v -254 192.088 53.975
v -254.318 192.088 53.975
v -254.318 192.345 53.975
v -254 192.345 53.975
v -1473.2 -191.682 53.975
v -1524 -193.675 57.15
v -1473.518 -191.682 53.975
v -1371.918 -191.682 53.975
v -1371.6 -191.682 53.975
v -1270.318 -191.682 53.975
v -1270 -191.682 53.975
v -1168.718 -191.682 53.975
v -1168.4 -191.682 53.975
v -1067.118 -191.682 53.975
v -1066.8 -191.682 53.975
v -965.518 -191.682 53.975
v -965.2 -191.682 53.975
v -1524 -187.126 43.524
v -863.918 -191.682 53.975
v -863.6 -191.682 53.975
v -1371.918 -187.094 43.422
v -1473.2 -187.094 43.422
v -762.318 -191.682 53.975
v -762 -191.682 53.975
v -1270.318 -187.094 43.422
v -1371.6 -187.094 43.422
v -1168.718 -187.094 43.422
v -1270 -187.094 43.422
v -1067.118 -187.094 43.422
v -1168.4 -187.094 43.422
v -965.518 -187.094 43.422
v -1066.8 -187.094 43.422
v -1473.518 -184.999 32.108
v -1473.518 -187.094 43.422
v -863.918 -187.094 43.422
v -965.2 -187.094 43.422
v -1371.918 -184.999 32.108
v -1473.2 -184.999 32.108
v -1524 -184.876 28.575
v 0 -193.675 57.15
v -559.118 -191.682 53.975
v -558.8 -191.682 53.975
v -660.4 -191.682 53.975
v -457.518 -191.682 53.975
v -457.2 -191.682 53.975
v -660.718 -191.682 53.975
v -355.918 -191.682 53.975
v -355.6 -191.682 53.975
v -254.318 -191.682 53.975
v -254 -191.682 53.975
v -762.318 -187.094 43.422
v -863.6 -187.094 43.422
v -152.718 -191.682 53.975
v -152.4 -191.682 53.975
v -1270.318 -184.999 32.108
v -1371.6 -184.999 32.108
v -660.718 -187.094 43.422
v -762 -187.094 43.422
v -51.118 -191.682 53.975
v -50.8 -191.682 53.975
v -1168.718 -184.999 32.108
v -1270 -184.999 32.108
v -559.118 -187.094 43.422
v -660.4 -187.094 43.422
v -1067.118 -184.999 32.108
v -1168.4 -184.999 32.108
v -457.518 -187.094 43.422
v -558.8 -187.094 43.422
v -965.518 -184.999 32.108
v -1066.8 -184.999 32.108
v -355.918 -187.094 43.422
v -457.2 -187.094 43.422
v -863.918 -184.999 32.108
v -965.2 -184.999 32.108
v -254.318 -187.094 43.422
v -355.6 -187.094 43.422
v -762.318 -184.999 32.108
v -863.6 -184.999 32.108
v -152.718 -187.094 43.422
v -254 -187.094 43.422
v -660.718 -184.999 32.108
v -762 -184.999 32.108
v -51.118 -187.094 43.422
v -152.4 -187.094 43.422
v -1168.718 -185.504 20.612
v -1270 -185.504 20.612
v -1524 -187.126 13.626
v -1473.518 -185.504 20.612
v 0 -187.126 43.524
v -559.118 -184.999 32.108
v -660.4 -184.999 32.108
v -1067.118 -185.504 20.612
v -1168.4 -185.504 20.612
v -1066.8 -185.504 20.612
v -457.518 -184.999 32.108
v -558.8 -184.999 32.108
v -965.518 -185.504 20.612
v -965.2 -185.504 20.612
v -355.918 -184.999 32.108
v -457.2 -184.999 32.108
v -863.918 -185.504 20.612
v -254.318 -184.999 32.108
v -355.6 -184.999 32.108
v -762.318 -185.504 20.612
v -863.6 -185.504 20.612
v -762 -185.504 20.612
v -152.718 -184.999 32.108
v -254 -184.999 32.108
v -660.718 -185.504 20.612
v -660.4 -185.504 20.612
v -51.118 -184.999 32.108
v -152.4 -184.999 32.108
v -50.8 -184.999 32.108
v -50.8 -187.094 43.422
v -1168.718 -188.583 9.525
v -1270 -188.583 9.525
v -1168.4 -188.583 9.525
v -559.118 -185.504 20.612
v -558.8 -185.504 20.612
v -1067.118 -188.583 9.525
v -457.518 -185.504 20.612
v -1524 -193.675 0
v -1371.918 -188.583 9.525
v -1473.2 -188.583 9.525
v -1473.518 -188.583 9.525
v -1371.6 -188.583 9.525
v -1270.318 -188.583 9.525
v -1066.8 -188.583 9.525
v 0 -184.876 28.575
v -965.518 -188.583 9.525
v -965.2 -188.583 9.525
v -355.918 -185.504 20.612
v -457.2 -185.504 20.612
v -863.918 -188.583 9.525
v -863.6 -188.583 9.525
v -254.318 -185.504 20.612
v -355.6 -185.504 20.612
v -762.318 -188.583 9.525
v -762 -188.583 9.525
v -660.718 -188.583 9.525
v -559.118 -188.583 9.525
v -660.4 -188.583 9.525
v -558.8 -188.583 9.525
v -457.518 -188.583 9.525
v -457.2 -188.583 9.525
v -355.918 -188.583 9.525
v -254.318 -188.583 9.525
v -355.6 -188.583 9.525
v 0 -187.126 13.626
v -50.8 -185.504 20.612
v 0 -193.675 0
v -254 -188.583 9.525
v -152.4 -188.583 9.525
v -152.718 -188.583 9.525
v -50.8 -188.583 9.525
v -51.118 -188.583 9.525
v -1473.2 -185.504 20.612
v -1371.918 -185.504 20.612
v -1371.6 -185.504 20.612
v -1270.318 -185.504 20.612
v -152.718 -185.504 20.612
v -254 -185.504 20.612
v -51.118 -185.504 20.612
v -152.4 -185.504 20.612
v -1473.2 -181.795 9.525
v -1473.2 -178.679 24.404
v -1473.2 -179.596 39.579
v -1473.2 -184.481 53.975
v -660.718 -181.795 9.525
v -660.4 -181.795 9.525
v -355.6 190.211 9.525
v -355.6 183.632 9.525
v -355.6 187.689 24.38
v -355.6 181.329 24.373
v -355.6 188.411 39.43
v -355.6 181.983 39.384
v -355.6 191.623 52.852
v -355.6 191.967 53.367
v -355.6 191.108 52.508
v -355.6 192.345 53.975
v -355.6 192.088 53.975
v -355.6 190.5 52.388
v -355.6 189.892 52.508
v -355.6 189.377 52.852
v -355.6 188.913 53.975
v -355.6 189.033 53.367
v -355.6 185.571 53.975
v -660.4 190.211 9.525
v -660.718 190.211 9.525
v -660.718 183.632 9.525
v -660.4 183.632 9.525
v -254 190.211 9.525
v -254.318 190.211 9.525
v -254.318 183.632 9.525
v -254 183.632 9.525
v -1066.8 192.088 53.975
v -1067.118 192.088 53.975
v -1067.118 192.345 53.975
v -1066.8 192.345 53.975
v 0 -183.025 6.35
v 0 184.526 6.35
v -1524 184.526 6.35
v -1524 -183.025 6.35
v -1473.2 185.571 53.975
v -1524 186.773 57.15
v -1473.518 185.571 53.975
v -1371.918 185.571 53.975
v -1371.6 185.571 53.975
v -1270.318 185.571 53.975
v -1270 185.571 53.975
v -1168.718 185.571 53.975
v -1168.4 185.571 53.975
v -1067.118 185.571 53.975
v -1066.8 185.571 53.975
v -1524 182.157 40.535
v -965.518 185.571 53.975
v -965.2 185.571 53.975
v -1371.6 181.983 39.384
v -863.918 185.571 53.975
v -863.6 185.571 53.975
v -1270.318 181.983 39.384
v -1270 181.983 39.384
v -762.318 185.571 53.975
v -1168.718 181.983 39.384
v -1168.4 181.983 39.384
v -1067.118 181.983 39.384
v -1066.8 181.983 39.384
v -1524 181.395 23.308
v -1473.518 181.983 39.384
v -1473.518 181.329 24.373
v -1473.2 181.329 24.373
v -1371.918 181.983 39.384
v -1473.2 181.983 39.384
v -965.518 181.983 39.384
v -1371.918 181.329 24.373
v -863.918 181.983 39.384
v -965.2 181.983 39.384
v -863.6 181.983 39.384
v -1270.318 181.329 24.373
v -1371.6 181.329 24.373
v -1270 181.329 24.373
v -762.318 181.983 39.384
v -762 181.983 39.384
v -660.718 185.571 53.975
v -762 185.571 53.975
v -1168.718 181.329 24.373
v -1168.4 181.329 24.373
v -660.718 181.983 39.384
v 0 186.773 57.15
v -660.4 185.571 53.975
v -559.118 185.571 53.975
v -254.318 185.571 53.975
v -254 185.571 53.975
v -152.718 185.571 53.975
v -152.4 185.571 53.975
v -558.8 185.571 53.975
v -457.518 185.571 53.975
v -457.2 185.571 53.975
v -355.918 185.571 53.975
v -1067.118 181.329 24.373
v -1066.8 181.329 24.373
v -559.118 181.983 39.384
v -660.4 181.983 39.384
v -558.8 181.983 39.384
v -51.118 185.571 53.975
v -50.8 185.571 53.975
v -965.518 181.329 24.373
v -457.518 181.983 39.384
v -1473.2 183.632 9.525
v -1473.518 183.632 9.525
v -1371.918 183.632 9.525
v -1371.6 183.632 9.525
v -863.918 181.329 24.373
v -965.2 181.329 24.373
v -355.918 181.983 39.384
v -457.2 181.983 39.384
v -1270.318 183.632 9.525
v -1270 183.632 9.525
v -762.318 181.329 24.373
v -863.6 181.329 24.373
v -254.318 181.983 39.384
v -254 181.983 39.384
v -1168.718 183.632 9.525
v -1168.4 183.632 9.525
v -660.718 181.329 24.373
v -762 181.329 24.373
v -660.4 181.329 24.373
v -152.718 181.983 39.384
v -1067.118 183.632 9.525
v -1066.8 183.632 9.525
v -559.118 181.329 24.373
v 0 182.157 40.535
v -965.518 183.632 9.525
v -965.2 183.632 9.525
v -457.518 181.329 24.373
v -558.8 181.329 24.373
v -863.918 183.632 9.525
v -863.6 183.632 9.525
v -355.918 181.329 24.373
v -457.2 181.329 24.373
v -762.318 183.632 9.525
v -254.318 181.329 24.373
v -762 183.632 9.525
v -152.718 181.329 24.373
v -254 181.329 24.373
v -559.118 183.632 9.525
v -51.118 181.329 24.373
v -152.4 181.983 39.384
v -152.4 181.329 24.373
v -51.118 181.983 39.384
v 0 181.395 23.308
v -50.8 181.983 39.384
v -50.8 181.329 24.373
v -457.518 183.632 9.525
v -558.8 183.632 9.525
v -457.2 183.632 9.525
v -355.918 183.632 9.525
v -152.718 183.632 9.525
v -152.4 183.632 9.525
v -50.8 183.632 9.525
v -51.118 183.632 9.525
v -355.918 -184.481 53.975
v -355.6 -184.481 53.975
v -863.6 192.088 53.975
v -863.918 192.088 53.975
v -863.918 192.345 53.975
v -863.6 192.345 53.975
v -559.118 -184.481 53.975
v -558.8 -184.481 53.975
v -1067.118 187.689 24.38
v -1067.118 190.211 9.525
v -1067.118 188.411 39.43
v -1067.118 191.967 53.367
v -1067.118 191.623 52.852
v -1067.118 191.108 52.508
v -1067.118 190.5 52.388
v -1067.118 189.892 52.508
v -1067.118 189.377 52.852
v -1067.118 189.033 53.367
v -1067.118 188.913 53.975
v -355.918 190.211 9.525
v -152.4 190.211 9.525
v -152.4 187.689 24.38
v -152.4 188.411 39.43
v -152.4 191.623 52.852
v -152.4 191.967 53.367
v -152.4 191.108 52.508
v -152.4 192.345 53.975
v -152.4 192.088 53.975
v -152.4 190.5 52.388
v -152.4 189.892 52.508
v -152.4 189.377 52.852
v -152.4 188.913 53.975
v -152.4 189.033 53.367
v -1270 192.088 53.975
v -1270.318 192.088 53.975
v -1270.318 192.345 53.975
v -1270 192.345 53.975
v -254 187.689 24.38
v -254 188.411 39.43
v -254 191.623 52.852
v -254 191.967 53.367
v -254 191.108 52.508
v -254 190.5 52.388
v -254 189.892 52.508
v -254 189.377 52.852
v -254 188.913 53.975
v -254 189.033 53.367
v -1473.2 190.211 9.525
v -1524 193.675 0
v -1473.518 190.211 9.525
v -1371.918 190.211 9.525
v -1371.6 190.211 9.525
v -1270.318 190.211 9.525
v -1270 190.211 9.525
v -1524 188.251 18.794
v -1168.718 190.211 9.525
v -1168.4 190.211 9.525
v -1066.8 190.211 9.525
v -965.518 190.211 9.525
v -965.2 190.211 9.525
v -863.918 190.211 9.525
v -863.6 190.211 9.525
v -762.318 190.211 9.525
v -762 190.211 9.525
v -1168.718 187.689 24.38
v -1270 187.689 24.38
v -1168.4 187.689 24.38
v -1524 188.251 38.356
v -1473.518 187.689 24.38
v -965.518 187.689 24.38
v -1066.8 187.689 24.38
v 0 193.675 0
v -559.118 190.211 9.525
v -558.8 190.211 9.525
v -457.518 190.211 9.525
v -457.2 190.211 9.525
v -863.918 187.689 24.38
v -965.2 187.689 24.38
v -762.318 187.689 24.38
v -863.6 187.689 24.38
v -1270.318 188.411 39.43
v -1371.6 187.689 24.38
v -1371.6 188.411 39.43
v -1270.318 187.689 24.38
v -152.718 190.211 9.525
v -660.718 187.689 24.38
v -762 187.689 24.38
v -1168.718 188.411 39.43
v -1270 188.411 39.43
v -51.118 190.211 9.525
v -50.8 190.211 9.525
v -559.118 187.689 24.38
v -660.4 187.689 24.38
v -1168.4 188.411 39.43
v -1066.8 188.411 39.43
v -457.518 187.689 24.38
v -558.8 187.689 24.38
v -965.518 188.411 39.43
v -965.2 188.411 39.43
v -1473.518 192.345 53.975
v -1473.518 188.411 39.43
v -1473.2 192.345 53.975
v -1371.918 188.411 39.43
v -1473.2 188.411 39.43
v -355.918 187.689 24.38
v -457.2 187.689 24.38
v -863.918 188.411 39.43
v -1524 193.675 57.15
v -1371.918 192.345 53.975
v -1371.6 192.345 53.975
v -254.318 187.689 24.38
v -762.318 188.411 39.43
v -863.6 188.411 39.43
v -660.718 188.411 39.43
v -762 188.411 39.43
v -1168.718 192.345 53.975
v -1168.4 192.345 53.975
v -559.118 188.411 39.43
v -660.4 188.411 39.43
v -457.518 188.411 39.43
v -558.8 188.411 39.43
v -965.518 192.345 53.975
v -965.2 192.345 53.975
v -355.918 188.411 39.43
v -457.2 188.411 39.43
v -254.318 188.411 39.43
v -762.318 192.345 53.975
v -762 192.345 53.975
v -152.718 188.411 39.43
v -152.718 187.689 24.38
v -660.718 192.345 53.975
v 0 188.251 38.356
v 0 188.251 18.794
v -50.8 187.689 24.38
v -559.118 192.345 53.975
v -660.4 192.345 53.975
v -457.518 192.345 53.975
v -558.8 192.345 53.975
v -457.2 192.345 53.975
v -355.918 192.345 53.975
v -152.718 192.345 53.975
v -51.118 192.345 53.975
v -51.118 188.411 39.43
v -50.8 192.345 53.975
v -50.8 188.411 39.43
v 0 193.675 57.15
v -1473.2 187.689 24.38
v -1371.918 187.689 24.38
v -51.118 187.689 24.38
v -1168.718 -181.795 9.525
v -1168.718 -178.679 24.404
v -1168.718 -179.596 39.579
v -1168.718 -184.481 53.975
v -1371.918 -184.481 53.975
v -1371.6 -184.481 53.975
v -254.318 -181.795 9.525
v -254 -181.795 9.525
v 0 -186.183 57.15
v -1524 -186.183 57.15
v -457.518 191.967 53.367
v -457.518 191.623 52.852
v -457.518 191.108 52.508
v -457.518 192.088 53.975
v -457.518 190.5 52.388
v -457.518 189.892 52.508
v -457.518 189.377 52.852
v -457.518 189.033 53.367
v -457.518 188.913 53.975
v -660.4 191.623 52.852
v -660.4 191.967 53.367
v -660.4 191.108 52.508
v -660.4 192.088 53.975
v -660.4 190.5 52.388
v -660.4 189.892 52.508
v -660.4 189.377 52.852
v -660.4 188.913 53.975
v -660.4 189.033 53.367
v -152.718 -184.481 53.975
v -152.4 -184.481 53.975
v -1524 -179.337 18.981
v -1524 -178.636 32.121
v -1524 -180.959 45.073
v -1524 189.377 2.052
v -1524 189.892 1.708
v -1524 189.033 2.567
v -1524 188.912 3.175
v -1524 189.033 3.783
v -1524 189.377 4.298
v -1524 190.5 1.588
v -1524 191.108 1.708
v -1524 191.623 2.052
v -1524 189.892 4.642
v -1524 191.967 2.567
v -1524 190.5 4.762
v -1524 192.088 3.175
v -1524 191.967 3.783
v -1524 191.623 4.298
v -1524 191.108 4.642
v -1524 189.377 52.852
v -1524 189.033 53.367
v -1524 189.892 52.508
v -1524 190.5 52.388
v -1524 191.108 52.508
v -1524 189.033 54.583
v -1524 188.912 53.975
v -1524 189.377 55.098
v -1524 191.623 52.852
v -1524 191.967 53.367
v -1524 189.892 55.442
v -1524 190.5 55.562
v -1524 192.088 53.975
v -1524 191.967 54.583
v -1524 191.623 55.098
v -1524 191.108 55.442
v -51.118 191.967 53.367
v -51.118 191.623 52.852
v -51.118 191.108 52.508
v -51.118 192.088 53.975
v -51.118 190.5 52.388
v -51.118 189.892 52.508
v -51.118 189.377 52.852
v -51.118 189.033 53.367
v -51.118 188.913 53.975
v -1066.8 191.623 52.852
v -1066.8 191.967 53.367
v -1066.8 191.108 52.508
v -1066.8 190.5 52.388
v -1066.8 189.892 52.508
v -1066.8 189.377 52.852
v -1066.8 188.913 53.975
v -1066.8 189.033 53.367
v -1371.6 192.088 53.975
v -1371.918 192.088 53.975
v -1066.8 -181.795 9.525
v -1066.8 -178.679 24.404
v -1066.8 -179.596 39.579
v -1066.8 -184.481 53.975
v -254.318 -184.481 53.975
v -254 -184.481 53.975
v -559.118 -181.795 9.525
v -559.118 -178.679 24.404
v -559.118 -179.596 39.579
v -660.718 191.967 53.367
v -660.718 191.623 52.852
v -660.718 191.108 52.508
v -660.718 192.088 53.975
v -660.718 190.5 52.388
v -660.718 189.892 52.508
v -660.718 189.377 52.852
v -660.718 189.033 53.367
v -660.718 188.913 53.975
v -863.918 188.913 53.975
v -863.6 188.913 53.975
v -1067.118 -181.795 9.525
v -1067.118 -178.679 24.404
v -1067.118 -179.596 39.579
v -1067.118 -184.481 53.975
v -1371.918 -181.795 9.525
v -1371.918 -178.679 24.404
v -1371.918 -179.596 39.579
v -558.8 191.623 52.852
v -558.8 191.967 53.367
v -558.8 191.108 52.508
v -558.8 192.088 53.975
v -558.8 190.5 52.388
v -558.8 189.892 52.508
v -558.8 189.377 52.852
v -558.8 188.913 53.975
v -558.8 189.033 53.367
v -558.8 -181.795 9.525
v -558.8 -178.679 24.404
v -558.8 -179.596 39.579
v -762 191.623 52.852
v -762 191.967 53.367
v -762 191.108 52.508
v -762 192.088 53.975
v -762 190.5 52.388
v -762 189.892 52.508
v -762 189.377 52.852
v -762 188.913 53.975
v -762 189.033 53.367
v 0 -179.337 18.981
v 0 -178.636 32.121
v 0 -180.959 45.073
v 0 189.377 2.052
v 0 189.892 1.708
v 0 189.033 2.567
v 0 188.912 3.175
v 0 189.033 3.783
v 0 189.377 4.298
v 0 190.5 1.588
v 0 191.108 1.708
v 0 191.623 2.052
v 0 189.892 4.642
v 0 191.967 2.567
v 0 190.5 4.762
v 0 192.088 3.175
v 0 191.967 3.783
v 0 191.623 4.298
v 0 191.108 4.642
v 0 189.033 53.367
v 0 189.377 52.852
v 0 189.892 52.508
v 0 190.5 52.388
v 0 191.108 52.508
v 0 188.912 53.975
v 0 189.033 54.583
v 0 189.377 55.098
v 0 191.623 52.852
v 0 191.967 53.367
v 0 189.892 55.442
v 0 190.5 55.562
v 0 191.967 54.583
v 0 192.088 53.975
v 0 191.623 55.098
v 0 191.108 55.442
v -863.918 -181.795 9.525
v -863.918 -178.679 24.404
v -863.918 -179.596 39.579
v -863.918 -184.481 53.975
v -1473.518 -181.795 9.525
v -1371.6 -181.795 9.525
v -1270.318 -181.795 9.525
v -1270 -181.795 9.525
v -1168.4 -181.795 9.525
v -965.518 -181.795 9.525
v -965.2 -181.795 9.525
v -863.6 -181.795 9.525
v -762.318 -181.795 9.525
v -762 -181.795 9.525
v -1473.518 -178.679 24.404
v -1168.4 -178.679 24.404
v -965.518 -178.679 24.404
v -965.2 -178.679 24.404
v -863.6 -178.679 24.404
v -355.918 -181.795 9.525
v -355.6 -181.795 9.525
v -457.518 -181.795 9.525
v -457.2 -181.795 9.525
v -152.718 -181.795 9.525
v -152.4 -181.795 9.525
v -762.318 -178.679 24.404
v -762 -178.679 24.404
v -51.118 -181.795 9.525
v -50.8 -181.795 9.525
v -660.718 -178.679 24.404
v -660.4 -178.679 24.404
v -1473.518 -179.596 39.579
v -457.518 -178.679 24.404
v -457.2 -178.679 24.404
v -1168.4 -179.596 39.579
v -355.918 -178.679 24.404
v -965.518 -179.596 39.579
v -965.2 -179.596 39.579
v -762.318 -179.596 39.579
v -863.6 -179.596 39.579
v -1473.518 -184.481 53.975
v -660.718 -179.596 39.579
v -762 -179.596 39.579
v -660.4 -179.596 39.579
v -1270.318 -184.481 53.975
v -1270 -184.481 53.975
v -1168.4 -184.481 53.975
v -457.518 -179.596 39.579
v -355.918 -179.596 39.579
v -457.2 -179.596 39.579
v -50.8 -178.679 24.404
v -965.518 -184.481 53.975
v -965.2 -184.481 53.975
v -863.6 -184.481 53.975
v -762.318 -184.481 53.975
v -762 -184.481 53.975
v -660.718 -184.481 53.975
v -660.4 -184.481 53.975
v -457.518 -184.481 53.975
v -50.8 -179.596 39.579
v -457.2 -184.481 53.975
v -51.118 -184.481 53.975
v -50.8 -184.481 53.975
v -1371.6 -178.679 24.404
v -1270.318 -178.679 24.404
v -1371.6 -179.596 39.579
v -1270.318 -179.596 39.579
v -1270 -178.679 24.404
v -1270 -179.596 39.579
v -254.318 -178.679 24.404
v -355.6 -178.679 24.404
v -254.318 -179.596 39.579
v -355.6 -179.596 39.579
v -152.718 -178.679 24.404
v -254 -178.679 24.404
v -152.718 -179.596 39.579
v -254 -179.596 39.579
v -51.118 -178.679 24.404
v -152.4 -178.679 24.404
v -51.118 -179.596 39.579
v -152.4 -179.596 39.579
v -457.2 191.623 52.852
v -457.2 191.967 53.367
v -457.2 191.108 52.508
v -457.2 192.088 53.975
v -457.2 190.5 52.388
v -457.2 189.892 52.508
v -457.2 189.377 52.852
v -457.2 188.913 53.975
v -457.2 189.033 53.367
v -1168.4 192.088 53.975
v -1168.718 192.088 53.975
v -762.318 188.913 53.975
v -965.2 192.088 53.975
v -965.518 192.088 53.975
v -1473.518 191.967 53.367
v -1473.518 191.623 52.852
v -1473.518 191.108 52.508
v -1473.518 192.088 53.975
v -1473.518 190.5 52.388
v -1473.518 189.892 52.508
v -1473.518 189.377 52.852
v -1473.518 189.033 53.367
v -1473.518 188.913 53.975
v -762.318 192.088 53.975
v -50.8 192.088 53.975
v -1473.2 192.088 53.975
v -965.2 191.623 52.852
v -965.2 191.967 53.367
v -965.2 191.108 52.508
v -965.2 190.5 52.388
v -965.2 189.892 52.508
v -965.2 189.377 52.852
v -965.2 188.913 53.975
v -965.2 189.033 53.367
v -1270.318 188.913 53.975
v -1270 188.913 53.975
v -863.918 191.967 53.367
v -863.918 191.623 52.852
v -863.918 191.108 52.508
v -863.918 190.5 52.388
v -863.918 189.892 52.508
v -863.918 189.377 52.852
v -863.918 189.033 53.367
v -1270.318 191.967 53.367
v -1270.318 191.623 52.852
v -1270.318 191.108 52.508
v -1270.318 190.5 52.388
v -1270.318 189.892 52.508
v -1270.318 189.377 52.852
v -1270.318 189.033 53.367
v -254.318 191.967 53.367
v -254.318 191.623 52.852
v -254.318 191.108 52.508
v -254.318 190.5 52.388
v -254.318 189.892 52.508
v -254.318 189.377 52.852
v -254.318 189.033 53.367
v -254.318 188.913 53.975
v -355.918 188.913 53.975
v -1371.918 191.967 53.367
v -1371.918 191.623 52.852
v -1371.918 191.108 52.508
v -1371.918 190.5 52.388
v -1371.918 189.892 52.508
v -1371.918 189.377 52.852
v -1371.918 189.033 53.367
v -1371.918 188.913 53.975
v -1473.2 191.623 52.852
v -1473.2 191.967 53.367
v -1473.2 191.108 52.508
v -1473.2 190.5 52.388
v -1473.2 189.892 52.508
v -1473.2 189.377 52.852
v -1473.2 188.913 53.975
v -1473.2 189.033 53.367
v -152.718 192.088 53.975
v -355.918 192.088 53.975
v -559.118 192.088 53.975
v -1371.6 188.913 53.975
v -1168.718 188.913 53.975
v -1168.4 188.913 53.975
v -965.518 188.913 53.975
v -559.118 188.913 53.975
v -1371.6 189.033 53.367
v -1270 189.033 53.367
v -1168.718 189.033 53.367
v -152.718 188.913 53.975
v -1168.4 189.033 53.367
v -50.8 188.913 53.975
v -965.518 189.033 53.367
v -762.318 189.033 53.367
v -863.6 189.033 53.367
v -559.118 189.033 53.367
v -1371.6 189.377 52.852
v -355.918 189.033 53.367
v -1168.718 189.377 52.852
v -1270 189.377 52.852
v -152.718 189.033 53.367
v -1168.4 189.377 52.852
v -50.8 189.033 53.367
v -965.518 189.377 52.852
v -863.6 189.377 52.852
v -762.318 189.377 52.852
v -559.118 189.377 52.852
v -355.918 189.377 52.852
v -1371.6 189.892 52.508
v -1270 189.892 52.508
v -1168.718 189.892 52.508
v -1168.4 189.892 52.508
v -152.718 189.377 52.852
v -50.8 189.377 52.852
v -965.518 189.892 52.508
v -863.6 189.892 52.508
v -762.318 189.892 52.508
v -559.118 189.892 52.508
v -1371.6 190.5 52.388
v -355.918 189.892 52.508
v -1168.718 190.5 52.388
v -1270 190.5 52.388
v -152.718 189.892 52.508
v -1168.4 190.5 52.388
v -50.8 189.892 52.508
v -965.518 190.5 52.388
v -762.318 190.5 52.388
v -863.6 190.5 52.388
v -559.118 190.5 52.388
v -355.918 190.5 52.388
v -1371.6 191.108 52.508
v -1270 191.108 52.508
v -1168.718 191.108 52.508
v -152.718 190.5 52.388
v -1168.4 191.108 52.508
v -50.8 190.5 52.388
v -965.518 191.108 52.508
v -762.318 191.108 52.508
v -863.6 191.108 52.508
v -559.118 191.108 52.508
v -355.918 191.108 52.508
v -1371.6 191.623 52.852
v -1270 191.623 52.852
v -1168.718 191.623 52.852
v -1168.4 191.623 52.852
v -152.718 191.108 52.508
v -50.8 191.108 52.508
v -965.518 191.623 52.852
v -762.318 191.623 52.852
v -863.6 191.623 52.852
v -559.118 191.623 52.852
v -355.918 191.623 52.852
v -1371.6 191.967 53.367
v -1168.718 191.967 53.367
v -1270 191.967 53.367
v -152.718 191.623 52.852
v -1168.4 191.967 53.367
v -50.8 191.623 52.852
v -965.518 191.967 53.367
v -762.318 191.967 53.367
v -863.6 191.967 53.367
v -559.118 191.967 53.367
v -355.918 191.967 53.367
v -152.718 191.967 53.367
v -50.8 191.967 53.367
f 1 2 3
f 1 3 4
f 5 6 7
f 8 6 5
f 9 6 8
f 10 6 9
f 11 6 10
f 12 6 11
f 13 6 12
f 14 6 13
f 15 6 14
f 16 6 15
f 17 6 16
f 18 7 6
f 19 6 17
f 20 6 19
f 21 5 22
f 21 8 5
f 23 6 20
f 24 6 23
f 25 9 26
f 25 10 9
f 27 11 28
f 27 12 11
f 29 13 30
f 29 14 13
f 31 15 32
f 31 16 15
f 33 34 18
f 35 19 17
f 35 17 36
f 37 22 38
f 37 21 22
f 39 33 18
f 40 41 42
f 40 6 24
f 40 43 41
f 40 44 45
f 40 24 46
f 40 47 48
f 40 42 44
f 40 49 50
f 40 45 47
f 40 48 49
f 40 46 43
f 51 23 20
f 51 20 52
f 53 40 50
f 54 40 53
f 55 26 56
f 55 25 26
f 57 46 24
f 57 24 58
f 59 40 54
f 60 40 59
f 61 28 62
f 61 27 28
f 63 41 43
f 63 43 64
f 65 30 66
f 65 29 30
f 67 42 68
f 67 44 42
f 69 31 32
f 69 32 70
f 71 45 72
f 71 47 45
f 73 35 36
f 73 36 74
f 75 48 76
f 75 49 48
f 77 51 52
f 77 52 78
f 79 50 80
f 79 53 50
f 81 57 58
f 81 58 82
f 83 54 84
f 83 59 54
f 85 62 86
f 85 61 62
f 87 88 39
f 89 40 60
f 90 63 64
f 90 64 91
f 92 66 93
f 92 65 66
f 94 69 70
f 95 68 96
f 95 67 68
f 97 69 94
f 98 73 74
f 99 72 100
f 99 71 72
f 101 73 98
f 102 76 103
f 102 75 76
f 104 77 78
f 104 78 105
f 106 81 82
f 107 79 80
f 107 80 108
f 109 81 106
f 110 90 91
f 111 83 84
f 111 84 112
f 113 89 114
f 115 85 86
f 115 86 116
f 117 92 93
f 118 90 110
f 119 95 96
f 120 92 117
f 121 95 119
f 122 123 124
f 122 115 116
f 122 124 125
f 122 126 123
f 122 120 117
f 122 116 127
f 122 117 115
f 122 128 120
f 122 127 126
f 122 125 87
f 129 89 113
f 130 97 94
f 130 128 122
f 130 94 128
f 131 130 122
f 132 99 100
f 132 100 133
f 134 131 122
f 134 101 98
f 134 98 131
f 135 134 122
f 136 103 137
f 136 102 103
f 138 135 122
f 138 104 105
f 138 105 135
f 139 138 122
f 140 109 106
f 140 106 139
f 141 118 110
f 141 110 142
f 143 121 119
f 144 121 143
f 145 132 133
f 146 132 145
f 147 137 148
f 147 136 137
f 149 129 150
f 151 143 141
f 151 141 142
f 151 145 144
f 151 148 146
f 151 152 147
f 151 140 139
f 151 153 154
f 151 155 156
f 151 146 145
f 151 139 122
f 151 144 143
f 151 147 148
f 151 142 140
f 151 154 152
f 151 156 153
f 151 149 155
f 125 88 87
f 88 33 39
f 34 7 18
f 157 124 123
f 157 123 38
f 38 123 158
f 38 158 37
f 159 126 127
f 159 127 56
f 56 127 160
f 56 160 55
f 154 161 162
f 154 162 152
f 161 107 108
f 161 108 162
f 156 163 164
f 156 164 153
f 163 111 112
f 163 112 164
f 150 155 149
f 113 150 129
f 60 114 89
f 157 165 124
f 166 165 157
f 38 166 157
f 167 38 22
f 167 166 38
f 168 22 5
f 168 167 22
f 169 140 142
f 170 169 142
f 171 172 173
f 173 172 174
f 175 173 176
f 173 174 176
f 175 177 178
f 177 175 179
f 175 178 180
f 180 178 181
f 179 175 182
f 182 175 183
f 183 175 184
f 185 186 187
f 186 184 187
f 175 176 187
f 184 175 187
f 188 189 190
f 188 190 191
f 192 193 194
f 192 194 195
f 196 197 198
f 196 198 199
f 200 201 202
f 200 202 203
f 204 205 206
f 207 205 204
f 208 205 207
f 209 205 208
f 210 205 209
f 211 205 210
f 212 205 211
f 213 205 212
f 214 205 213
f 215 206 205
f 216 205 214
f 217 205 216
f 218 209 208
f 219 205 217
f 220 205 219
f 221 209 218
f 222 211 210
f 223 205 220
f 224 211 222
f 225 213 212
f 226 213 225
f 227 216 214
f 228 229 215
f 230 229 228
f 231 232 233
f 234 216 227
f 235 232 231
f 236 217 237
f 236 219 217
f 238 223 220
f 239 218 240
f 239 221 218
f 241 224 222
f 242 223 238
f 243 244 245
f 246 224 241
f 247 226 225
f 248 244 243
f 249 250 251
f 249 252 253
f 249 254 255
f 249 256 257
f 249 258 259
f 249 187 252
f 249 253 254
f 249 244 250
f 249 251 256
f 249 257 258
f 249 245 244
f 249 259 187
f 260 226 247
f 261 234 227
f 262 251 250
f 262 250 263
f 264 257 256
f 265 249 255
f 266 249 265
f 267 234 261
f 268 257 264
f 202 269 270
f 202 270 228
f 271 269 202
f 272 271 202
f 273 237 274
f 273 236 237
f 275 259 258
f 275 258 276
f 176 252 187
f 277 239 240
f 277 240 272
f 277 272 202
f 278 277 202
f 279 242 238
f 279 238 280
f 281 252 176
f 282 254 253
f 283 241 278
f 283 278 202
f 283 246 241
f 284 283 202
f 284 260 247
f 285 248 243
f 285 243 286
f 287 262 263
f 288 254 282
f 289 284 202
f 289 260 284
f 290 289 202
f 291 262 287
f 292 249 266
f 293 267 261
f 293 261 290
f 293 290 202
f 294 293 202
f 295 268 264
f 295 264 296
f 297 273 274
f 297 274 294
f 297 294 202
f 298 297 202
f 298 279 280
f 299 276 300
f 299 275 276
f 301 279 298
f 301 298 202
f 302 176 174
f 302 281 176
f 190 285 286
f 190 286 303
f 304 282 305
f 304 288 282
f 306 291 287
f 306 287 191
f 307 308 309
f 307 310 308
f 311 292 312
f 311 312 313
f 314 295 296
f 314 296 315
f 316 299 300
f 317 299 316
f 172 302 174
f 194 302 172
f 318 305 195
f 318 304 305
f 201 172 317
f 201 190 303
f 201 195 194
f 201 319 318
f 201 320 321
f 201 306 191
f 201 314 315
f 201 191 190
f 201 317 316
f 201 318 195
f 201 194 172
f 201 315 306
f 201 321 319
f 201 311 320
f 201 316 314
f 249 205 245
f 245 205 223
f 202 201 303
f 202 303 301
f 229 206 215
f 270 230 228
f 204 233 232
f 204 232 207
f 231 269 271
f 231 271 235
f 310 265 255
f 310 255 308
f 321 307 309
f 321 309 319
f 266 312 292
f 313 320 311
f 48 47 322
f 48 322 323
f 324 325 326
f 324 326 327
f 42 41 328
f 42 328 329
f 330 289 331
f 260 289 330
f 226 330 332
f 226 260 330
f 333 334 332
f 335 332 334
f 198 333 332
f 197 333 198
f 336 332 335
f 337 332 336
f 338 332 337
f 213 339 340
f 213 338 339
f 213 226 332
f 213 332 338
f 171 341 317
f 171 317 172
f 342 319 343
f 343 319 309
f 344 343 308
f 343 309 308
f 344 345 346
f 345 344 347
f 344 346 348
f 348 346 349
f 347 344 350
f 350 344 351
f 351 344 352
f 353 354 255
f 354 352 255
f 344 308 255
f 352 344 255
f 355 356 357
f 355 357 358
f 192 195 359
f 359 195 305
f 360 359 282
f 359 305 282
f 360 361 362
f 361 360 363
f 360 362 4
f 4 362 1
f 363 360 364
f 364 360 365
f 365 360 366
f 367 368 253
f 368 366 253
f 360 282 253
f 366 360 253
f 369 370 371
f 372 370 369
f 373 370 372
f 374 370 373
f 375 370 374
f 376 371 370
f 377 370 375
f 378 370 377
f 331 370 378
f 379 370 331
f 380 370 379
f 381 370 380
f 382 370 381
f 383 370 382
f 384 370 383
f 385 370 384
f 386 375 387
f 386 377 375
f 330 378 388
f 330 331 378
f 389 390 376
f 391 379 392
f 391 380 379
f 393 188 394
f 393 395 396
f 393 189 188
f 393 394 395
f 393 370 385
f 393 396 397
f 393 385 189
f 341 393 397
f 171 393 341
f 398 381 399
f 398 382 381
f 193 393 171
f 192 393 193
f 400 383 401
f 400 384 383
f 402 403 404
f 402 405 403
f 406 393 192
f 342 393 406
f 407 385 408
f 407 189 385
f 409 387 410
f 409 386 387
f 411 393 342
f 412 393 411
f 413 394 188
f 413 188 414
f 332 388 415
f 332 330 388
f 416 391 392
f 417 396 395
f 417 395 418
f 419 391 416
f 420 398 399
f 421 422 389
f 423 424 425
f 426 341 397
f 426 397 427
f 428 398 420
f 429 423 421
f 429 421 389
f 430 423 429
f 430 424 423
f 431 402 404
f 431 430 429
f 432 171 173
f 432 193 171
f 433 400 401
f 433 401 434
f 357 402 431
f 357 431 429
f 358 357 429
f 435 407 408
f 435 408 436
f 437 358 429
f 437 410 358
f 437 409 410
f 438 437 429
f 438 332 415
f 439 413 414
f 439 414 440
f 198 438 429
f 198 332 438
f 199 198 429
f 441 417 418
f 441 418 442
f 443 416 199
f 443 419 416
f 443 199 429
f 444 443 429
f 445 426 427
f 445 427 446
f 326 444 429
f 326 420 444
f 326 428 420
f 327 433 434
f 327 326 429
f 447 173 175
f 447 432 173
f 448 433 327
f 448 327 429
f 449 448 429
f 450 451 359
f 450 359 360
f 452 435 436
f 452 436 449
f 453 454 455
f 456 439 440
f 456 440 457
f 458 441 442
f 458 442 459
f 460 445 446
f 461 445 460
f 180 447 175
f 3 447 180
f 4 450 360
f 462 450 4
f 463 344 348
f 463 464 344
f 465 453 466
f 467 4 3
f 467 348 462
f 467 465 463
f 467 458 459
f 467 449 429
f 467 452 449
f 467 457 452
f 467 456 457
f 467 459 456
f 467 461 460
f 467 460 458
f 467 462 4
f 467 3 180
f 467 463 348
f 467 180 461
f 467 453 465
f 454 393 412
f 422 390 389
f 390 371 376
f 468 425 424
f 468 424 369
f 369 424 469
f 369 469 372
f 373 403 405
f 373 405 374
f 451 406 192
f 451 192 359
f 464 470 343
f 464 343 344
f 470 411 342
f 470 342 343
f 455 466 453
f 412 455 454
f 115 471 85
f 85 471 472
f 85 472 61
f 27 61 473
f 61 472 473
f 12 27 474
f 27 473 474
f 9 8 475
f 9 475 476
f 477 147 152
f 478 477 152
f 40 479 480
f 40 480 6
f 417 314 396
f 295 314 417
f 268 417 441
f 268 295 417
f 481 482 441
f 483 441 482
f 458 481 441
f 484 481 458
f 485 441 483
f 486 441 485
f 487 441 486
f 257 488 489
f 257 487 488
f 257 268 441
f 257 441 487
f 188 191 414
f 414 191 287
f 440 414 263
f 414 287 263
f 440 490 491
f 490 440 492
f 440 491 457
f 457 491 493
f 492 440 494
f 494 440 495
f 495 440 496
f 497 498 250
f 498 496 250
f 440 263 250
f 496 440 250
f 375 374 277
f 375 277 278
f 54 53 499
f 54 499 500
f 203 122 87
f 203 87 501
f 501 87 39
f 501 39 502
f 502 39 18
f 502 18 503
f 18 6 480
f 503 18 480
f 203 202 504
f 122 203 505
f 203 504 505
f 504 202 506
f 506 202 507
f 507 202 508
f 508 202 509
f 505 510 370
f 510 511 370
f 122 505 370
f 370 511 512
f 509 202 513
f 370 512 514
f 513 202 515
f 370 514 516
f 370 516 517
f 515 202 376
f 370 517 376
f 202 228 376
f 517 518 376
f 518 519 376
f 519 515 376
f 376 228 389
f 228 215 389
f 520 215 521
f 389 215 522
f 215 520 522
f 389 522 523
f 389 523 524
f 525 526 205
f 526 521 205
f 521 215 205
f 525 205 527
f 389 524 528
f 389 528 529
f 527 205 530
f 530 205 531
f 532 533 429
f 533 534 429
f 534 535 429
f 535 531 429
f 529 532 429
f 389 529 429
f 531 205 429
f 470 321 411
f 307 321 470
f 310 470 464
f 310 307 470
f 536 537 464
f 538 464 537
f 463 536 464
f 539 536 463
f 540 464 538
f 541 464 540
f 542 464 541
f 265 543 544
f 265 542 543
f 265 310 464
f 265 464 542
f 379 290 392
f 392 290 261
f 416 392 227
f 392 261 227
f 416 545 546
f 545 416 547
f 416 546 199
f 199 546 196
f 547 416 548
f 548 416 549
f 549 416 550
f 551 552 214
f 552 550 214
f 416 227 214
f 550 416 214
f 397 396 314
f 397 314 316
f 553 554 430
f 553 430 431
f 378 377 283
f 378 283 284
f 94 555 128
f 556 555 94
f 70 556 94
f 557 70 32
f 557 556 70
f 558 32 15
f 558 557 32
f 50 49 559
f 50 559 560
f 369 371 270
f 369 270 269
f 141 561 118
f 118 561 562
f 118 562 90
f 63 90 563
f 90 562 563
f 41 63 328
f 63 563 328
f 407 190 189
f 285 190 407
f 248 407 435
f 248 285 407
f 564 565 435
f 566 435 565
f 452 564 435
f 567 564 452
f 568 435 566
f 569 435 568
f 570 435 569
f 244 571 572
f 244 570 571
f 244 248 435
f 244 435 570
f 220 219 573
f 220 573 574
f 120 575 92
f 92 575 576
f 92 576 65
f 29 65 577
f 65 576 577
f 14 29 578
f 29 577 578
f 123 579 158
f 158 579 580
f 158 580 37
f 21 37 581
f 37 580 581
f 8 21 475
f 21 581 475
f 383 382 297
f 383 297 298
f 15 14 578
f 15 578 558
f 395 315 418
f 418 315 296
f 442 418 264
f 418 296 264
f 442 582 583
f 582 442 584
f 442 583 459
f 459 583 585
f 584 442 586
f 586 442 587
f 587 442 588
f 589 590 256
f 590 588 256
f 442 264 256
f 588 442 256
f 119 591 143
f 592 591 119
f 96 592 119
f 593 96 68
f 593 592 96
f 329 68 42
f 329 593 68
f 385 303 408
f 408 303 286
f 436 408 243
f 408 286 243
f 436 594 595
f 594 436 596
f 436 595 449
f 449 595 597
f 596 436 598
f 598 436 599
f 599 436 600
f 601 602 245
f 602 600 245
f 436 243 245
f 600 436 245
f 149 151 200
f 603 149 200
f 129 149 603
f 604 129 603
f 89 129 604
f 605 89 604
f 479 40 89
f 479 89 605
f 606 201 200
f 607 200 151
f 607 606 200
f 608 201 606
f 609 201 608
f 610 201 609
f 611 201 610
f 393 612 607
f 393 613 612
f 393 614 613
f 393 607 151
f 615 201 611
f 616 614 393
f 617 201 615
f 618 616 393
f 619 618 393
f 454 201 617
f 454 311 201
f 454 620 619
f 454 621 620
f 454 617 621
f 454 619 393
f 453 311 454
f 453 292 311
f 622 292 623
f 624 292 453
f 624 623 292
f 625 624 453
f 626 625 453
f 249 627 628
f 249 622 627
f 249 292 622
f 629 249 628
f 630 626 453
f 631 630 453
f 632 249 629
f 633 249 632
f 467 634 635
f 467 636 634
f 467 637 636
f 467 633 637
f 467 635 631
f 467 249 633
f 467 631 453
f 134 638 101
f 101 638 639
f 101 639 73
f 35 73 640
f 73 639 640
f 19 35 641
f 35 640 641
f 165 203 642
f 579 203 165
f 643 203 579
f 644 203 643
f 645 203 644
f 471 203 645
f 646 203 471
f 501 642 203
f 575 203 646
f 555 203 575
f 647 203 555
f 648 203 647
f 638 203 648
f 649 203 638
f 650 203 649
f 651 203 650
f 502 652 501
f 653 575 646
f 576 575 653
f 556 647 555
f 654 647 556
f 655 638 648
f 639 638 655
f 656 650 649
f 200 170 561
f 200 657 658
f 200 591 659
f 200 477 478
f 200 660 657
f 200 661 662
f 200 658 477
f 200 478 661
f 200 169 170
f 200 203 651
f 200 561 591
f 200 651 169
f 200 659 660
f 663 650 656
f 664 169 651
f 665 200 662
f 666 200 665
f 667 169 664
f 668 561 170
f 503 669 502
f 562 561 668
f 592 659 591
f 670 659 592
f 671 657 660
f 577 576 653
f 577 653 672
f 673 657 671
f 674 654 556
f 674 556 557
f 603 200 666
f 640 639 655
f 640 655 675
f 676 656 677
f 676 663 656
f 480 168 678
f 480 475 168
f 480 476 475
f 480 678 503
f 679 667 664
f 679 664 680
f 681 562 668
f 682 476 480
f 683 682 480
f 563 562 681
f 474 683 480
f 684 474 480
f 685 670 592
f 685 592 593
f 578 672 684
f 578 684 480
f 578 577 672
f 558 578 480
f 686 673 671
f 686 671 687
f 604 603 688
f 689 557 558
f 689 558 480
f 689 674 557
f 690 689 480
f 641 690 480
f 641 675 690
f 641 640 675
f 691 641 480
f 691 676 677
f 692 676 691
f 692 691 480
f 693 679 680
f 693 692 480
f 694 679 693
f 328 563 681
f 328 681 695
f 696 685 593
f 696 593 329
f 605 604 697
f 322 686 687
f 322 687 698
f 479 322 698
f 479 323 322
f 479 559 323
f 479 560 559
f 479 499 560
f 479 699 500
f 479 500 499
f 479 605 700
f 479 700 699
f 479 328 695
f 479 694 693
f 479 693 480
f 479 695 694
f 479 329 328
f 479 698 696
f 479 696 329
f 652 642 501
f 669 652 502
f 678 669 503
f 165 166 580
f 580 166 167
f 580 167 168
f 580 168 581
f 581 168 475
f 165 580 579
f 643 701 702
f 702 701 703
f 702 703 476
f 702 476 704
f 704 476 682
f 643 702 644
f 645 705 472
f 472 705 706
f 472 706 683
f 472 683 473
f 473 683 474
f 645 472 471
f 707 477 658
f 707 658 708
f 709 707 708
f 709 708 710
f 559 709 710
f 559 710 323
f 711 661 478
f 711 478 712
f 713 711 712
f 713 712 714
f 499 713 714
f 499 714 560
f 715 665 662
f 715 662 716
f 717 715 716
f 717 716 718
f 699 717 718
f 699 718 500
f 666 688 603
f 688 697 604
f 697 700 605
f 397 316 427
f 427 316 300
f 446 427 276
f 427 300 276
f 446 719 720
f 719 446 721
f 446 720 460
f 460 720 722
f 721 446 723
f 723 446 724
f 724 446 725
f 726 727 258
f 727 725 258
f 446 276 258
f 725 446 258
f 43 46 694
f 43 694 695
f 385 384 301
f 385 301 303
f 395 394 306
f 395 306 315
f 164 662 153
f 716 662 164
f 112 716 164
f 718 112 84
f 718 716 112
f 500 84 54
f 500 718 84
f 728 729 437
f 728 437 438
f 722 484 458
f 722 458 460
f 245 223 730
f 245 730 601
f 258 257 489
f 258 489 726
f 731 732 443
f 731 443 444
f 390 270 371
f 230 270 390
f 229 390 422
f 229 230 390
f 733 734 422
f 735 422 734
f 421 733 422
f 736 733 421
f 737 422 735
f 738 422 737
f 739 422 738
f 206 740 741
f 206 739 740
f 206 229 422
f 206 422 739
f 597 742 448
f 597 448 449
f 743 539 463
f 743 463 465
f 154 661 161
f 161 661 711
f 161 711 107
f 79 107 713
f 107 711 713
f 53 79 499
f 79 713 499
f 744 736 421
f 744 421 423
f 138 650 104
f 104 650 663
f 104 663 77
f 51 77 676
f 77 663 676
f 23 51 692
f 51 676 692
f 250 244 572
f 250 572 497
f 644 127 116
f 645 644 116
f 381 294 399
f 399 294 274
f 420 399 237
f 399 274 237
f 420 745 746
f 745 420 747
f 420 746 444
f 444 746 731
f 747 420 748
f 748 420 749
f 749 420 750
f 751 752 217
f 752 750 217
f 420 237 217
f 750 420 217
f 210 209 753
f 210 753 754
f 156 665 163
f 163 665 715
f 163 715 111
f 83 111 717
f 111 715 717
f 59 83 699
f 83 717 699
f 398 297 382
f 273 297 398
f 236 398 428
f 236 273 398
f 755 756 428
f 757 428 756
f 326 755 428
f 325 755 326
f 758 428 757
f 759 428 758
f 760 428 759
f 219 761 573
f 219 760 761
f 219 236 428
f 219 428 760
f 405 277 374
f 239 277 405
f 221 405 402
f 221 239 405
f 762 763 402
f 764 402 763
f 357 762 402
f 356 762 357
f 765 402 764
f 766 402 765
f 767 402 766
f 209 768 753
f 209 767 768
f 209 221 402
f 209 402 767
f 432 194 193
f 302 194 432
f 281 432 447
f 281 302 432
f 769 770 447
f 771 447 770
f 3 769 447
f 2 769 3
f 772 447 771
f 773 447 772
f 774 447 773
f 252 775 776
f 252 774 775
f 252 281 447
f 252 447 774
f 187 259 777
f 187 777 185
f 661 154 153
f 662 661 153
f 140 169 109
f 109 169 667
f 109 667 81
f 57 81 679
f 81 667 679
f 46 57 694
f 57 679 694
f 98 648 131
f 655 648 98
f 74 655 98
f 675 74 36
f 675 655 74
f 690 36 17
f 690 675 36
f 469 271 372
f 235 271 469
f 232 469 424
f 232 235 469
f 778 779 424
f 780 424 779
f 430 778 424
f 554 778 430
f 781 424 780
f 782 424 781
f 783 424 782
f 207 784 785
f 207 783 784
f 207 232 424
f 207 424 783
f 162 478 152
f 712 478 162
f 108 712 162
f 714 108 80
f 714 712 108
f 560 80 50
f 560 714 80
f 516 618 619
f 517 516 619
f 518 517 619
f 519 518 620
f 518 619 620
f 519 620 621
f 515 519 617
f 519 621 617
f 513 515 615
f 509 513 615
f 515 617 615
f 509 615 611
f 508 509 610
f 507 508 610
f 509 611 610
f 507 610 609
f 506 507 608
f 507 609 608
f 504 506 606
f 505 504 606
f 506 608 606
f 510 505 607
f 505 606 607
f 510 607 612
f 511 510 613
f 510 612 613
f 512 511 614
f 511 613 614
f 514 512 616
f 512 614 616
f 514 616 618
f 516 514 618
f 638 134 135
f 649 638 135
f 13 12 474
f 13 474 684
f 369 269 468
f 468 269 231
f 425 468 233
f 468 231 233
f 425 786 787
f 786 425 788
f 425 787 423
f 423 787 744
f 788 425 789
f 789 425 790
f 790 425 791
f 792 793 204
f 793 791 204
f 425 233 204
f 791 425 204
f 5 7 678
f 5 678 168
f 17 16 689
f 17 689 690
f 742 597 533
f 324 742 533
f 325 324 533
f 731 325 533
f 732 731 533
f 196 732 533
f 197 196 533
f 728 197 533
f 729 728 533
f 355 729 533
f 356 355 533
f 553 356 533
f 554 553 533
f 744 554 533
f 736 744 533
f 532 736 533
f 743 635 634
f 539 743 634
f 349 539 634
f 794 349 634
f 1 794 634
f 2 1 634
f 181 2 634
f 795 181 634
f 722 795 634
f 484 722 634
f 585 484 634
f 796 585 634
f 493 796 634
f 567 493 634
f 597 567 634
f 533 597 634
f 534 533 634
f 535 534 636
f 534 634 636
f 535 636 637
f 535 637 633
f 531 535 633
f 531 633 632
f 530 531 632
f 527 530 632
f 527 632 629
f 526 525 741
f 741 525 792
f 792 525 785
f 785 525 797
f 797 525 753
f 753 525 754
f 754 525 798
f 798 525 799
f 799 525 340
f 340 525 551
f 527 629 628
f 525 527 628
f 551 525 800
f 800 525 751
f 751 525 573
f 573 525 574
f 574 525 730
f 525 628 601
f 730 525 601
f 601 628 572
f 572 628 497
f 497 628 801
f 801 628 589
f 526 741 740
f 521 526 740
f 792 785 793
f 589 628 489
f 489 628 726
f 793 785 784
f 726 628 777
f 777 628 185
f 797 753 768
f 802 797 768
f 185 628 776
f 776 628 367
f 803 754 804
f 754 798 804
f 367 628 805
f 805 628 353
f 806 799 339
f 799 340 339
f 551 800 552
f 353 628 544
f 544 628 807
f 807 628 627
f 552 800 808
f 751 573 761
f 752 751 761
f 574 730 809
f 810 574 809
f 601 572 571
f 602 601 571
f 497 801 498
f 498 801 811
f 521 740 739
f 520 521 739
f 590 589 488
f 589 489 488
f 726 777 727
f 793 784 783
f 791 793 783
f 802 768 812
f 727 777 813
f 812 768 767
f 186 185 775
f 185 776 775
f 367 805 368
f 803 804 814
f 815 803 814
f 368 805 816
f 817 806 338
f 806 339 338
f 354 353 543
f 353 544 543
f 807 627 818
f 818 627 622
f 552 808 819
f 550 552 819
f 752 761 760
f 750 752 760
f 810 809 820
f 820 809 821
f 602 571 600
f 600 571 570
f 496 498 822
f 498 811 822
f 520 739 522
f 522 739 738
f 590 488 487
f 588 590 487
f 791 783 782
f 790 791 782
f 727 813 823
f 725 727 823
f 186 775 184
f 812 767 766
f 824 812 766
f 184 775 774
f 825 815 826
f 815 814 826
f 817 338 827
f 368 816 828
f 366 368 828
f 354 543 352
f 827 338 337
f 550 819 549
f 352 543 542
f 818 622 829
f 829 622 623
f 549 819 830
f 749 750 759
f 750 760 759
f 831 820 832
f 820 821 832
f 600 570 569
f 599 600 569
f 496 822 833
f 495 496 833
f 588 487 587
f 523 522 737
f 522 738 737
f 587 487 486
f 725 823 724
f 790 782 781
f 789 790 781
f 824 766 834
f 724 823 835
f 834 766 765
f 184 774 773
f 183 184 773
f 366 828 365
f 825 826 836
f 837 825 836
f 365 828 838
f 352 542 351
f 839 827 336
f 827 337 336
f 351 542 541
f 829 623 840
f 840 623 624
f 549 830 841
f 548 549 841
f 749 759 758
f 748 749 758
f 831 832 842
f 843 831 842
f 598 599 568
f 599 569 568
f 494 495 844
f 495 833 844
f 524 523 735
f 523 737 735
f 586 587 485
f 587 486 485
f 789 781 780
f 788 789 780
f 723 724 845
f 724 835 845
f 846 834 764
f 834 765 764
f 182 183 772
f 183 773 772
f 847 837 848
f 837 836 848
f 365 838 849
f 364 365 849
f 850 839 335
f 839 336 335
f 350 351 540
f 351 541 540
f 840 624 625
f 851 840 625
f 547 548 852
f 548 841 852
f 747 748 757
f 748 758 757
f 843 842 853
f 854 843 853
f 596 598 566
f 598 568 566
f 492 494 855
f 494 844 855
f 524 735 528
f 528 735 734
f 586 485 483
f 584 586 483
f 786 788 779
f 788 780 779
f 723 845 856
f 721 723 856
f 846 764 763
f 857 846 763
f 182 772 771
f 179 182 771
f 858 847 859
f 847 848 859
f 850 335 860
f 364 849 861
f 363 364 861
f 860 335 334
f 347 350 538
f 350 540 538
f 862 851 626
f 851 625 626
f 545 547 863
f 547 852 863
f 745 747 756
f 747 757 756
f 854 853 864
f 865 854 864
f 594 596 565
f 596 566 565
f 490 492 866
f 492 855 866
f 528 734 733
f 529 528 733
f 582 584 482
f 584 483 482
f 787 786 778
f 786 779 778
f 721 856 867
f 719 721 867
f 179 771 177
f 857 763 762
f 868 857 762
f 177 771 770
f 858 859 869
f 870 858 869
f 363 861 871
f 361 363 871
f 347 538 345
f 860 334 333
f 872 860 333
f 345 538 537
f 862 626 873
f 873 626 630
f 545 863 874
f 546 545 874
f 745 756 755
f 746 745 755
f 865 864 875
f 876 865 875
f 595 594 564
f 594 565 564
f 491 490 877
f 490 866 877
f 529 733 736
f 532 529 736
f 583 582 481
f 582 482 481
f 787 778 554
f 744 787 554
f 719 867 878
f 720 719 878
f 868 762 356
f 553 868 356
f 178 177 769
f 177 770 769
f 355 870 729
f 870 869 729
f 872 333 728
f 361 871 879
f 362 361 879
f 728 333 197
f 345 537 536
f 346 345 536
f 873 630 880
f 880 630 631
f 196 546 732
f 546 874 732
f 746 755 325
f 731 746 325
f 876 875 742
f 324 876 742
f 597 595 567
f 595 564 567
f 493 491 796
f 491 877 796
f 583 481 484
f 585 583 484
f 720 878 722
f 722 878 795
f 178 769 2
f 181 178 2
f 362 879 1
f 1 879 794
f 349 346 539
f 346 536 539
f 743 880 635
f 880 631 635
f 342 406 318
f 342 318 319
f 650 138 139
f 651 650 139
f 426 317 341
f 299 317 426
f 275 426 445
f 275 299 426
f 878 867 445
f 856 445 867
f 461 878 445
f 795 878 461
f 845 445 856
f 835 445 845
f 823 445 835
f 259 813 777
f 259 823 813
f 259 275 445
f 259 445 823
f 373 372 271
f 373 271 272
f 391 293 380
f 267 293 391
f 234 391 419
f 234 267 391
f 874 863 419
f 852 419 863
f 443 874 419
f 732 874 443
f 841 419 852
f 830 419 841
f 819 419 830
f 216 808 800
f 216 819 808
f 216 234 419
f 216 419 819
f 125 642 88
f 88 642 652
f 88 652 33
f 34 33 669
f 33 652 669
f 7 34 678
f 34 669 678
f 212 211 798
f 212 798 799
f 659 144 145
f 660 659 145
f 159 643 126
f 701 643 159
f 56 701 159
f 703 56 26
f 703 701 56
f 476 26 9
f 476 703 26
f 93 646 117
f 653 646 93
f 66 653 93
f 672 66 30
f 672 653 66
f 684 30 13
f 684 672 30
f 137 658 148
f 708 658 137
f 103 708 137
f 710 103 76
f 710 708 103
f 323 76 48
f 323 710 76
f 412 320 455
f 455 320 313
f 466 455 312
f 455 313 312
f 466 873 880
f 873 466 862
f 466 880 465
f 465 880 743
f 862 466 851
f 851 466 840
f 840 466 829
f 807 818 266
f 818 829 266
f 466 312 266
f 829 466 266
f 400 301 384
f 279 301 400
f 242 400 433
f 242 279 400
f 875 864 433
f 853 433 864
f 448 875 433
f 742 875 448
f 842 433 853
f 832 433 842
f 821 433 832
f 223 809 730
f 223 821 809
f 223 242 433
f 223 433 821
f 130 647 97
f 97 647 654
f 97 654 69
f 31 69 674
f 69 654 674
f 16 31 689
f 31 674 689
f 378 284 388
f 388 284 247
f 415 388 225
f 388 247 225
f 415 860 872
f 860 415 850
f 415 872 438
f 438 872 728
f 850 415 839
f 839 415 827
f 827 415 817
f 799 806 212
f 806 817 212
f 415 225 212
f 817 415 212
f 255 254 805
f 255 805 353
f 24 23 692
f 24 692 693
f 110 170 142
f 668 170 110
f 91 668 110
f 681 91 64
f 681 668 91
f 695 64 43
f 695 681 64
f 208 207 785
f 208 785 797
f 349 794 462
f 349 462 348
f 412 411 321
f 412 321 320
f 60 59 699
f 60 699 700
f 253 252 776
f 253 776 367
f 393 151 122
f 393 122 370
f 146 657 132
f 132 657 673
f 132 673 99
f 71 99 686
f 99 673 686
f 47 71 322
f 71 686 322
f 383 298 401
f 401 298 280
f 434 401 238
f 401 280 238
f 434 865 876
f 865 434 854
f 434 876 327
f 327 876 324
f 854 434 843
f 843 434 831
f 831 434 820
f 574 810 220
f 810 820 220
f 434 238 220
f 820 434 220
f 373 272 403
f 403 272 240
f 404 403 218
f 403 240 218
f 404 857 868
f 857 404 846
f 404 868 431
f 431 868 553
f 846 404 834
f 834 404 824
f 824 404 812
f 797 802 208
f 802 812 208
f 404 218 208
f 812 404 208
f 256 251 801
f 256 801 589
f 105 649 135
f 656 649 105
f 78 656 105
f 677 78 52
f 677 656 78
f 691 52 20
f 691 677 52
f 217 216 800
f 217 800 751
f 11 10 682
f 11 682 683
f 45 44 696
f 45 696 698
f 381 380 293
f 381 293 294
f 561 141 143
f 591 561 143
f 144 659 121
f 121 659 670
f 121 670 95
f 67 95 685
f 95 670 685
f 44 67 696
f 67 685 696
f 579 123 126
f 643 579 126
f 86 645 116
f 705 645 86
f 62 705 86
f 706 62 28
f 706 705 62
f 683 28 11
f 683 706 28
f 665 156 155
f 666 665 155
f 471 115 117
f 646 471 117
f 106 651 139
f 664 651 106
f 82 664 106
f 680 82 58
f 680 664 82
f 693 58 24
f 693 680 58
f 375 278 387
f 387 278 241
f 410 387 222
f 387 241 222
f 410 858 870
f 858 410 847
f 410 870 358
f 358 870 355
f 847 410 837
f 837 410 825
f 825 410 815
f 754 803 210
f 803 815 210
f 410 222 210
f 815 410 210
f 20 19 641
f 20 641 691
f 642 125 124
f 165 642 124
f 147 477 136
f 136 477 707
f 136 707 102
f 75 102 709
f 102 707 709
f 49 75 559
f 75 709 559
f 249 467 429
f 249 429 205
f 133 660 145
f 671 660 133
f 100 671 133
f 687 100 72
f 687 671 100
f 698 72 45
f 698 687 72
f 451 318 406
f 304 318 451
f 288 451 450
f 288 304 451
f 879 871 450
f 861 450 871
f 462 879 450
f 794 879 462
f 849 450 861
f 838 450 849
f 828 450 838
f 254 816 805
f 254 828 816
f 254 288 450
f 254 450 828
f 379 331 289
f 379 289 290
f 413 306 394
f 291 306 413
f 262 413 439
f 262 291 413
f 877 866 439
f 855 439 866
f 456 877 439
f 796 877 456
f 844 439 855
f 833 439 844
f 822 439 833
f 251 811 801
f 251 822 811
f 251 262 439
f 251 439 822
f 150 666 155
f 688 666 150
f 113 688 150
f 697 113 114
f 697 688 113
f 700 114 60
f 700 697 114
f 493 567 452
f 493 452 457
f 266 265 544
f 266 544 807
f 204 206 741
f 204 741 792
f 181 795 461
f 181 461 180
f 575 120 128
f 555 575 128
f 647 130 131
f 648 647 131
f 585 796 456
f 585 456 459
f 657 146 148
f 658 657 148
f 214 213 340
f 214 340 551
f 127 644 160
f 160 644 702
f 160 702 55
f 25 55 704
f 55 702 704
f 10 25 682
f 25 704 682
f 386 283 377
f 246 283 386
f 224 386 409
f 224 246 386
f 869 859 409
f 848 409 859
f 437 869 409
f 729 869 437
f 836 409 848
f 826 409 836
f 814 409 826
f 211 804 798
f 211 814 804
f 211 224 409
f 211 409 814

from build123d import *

# Parameters (mm, degrees)
F1_DEPTH      = 1524
F2_R          = 1.5875
F3_DEPTH      = 1524.001
F4_W          = 0.3175
F4_H          = 44.45
F5_DEPTH      = 193.3445428183
F5_DEPTH_BACK = 192.6822115509


with BuildPart() as f1:
    # F0 (on Right) → F1 (new body)
    with BuildSketch(Plane.YZ):
        with BuildLine():
            ThreePointArc((-193.675, 57.15), (-184.8763020632, 28.575), (-193.675, 0))
            Line((-193.675, 0), (193.675, 0))
            ThreePointArc((193.675, 0), (187.5626801821, 28.575), (193.675, 57.15))
            Line((193.675, 57.15), (186.7733895925, 57.15))
            ThreePointArc((186.7733895925, 57.15), (181.2871488449, 31.94300811), (184.5258543835, 6.35))
            Line((184.5258543835, 6.35), (-183.0248835163, 6.35))
            ThreePointArc((-183.0248835163, 6.35), (-178.6364166438, 32.1209796041), (-186.1829502369, 57.15))
            Line((-186.1829502369, 57.15), (-193.675, 57.15))
        make_face()
    extrude(amount=-F1_DEPTH)

    # F2 (on face) → F3 (cut, through all)
    with BuildSketch(Plane.YZ):
        with Locations((190.5, 53.975)):
            Circle(F2_R)
        with Locations((190.5, 3.175)):
            Circle(F2_R)
    extrude(amount=-F3_DEPTH, mode=Mode.SUBTRACT)

    # F4 (on Front) → F5 (cut, two sides)
    with BuildSketch(Plane.XZ) as f5_sk:
        with Locations((-50.95875, 31.75)):
            Rectangle(F4_W, F4_H)
        with Locations((-152.55875, 31.75)):
            Rectangle(F4_W, F4_H)
        with Locations((-254.15875, 31.75)):
            Rectangle(F4_W, F4_H)
        with Locations((-355.75875, 31.75)):
            Rectangle(F4_W, F4_H)
        with Locations((-457.35875, 31.75)):
            Rectangle(F4_W, F4_H)
        with Locations((-558.95875, 31.75)):
            Rectangle(F4_W, F4_H)
        with Locations((-660.55875, 31.75)):
            Rectangle(F4_W, F4_H)
        with Locations((-762.15875, 31.75)):
            Rectangle(F4_W, F4_H)
        with Locations((-863.75875, 31.75)):
            Rectangle(F4_W, F4_H)
        with Locations((-965.35875, 31.75)):
            Rectangle(F4_W, F4_H)
        with Locations((-1066.95875, 31.75)):
            Rectangle(F4_W, F4_H)
        with Locations((-1168.55875, 31.75)):
            Rectangle(F4_W, F4_H)
        with Locations((-1270.15875, 31.75)):
            Rectangle(F4_W, F4_H)
        with Locations((-1371.75875, 31.75)):
            Rectangle(F4_W, F4_H)
        with Locations((-1473.35875, 31.75)):
            Rectangle(F4_W, F4_H)
    extrude(amount=-F5_DEPTH, mode=Mode.SUBTRACT)
    extrude(f5_sk.sketch, amount=F5_DEPTH_BACK, mode=Mode.SUBTRACT)


solid = f1.part
